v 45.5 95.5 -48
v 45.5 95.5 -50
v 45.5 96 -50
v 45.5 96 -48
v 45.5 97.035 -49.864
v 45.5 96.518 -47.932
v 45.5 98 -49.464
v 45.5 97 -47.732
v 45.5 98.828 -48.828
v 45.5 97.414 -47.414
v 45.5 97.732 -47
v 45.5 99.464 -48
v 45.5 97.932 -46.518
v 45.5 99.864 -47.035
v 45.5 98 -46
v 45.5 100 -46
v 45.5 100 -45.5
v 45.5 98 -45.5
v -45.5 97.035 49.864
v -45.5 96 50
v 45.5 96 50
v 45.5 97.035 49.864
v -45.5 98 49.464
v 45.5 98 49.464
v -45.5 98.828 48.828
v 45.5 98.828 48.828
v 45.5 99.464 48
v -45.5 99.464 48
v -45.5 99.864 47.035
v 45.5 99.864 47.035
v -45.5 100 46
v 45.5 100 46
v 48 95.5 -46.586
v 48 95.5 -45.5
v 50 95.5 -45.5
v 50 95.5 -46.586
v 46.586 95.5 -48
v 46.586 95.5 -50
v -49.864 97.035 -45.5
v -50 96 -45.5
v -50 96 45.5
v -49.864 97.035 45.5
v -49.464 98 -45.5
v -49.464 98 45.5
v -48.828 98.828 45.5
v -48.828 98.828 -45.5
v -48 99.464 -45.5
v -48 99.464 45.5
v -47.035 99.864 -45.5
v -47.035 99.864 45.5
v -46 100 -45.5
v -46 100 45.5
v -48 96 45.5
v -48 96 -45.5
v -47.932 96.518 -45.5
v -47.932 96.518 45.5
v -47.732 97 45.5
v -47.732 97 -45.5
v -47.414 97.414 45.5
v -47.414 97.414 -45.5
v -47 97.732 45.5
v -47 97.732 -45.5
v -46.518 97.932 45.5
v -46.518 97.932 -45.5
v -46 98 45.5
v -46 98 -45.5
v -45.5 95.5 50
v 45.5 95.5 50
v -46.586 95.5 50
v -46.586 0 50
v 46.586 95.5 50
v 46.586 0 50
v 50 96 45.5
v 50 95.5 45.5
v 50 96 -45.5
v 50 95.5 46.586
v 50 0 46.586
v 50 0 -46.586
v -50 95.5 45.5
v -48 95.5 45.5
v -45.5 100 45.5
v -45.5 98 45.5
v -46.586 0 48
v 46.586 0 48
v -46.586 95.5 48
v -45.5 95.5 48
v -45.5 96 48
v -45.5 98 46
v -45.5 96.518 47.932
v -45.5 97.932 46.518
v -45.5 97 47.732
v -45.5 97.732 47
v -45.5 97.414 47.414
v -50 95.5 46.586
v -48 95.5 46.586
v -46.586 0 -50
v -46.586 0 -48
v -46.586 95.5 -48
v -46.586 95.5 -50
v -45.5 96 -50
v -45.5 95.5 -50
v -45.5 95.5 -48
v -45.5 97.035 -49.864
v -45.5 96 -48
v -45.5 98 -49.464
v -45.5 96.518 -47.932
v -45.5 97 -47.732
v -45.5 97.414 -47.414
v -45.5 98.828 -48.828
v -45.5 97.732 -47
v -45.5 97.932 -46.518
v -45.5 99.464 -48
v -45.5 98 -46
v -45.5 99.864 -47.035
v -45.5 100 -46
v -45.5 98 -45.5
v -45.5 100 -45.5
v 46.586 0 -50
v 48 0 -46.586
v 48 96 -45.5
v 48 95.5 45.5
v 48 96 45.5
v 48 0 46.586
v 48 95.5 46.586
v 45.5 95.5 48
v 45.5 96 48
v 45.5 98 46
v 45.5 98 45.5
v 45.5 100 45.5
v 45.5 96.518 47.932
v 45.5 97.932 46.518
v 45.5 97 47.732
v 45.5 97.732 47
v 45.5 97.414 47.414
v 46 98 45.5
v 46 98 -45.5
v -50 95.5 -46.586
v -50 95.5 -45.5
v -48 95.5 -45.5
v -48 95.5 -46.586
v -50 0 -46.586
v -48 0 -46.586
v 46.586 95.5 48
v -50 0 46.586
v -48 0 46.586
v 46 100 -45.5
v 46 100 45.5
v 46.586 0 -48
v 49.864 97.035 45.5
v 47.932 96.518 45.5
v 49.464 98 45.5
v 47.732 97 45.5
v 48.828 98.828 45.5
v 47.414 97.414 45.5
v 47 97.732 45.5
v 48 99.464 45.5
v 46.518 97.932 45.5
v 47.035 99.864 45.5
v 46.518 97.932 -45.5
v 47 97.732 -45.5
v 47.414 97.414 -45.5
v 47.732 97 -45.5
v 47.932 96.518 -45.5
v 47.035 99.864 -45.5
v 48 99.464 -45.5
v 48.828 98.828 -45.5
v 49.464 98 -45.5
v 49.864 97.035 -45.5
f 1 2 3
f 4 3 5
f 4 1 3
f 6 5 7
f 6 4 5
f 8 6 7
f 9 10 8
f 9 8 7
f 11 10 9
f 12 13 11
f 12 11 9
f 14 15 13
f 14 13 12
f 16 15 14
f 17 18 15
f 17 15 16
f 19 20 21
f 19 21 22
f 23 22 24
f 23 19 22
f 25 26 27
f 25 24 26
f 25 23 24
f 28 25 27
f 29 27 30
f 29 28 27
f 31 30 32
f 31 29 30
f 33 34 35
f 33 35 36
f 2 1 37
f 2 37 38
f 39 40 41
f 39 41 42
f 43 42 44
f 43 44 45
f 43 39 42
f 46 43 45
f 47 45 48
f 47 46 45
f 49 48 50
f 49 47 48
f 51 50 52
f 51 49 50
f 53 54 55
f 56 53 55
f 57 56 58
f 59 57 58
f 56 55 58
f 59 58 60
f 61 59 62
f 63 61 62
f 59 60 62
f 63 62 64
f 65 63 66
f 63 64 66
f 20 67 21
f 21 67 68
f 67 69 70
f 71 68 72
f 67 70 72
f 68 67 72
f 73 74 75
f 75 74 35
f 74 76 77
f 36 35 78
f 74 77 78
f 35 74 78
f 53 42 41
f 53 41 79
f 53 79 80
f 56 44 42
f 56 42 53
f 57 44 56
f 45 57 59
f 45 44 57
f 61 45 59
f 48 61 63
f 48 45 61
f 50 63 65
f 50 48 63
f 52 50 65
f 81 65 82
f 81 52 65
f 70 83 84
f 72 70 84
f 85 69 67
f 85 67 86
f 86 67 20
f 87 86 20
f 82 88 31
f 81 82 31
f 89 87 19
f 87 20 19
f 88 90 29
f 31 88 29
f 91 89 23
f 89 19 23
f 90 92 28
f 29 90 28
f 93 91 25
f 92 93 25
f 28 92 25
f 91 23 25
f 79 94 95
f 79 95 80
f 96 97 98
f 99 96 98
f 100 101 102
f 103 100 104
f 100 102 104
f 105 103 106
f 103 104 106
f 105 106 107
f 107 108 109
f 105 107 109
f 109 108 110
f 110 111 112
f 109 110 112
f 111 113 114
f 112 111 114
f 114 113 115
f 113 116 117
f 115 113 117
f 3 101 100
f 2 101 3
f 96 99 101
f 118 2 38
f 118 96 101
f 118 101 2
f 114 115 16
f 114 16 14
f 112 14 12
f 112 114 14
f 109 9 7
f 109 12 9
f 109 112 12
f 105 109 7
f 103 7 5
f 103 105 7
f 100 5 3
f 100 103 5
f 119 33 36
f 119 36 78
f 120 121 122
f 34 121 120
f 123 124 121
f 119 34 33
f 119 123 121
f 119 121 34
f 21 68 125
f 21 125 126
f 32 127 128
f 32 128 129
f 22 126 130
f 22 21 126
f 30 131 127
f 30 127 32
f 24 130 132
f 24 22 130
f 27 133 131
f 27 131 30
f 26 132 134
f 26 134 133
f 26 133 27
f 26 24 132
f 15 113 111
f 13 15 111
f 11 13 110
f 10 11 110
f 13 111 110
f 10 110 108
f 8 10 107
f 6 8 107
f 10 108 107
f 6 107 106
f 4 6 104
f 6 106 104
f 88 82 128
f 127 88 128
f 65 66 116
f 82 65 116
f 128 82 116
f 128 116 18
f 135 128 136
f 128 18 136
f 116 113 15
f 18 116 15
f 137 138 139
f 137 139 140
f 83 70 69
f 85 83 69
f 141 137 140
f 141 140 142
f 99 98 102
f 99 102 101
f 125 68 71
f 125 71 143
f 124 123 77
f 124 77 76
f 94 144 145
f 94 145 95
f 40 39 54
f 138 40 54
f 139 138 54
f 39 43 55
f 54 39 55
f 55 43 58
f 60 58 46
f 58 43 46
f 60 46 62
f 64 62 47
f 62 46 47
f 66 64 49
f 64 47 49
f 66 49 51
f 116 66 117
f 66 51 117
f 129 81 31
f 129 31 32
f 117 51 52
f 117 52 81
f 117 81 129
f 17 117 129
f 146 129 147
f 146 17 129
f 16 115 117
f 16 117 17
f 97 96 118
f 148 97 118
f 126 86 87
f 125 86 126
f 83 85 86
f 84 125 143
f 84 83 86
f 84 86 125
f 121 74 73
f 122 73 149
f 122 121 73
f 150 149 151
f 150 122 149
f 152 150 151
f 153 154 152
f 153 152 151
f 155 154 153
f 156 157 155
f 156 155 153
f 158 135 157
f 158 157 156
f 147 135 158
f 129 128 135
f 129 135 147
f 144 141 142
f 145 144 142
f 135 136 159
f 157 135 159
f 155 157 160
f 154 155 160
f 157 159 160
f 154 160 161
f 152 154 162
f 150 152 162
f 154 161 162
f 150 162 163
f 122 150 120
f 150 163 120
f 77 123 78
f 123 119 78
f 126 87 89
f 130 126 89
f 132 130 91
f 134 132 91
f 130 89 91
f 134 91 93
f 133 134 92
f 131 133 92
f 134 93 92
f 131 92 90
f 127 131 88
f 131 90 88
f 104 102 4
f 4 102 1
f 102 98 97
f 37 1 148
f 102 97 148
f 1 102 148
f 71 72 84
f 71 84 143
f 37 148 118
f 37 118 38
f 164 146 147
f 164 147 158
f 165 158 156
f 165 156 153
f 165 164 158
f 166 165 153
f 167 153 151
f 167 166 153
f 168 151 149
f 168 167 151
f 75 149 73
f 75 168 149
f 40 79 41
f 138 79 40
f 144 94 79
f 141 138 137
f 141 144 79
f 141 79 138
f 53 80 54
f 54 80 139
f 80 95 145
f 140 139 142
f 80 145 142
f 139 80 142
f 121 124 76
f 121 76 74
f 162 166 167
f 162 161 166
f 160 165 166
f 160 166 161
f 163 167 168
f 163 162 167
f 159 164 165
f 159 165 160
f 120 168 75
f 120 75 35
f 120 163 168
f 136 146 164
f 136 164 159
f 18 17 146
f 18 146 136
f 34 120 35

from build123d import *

# Parameters (mm, degrees)
SKETCH_1_W            = 100
SKETCH_1_H            = 100
EXTRUDE_1_DEPTH       = 100
SHELL_1_T             = -2
SHEET_START           = -51
SHEET_METAL_1_DEPTH   = 4.414213562
SHEET_START_2         = 46.585786438
SHEET_METAL_1_2_DEPTH = 4.414213562
SHEET_START_3         = -46.585786438
SHEET_METAL_1_3_DEPTH = 93.171572876
SHEET_METAL_1_4_DEPTH = 1.085786438
SHEET_START_4         = 45.5
SHEET_METAL_1_5_DEPTH = 1.085786438
SHEET_START_5         = -45.5
SHEET_METAL_1_6_DEPTH = 91
SHEET_METAL_1_7_DEPTH = 91
SHEET_METAL_1_8_DEPTH = 91


with BuildPart() as part:
    # Sketch 1 → 凸台-拉伸1 (new body)
    with BuildSketch(Plane(origin=(0, 0, 0), x_dir=(1, 0, 0), z_dir=(0, 1, 0))):
        Rectangle(SKETCH_1_W, SKETCH_1_H)
    extrude(amount=EXTRUDE_1_DEPTH)

    # 抽壳1
    shell_1_openings = [part.faces().sort_by_distance(p)[0] for p in [
        (0, 0, 0),
    ]]
    offset(amount=SHELL_1_T, openings=shell_1_openings, kind=Kind.INTERSECTION)

    # Sheet Metal 1: read off the stored shape, not the designer's step
    # Sheet Metal 1 outline → Sheet Metal 1 (cut)
    with BuildSketch(Plane.YZ.offset(SHEET_START)):
        Polygon((0, 50), (0, 46.585786438), (95.5, 46.585786438), (95.5, 45.5), (100, 45.5), (100, 50), align=None)
        Polygon((0, -46.585786438), (0, -50), (100, -50), (100, -45.5), (95.5, -45.5), (95.5, -46.585786438), align=None)
    extrude(amount=SHEET_METAL_1_DEPTH, mode=Mode.SUBTRACT)

    # Sheet Metal 1 2 outline → Sheet Metal 1 2 (cut)
    with BuildSketch(Plane.YZ.offset(SHEET_START_2)):
        Polygon((0, 50), (0, 46.585786438), (95.5, 46.585786438), (95.5, 45.5), (100, 45.5), (100, 50), align=None)
        Polygon((0, -46.585786438), (0, -50), (100, -50), (100, -45.5), (95.5, -45.5), (95.5, -46.585786438), align=None)
    extrude(amount=SHEET_METAL_1_2_DEPTH, mode=Mode.SUBTRACT)

    # Sheet Metal 1 3 outline → Sheet Metal 1 3 (cut)
    with BuildSketch(Plane.YZ.offset(SHEET_START_3)):
        with BuildLine():
            ThreePointArc((96, 50), (98.828427125, 48.828427125), (100, 46))
            Line((100, 46), (100, 50))
            Line((100, 50), (96, 50))
        make_face()
        with BuildLine():
            Line((100, -50), (100, -46))
            ThreePointArc((100, -46), (98.828427125, -48.828427125), (96, -50))
            Line((96, -50), (100, -50))
        make_face()
    extrude(amount=SHEET_METAL_1_3_DEPTH, mode=Mode.SUBTRACT)

    # Sheet Metal 1 4 outline → Sheet Metal 1 4 (cut)
    with BuildSketch(Plane.YZ.offset(SHEET_START_3)):
        with BuildLine():
            Line((98, 48), (98, 45.5))
            Line((98, 45.5), (100, 45.5))
            Line((100, 45.5), (100, 46))
            ThreePointArc((100, 46), (98.828427125, 48.828427125), (96, 50))
            Line((96, 50), (95.5, 50))
            Line((95.5, 50), (95.5, 48))
            Line((95.5, 48), (98, 48))
        make_face()
        with BuildLine():
            Line((100, -45.5), (98, -45.5))
            Line((98, -45.5), (98, -48))
            Line((98, -48), (95.5, -48))
            Line((95.5, -48), (95.5, -50))
            Line((95.5, -50), (96, -50))
            ThreePointArc((96, -50), (98.828427125, -48.828427125), (100, -46))
            Line((100, -46), (100, -45.5))
        make_face()
    extrude(amount=SHEET_METAL_1_4_DEPTH, mode=Mode.SUBTRACT)

    # Sheet Metal 1 5 outline → Sheet Metal 1 5 (cut)
    with BuildSketch(Plane.YZ.offset(SHEET_START_4)):
        with BuildLine():
            Line((98, 48), (98, 45.5))
            Line((98, 45.5), (100, 45.5))
            Line((100, 45.5), (100, 46))
            ThreePointArc((100, 46), (98.828427125, 48.828427125), (96, 50))
            Line((96, 50), (95.5, 50))
            Line((95.5, 50), (95.5, 48))
            Line((95.5, 48), (98, 48))
        make_face()
        with BuildLine():
            Line((100, -45.5), (98, -45.5))
            Line((98, -45.5), (98, -48))
            Line((98, -48), (95.5, -48))
            Line((95.5, -48), (95.5, -50))
            Line((95.5, -50), (96, -50))
            ThreePointArc((96, -50), (98.828427125, -48.828427125), (100, -46))
            Line((100, -46), (100, -45.5))
        make_face()
    extrude(amount=SHEET_METAL_1_5_DEPTH, mode=Mode.SUBTRACT)

    # Sheet Metal 1 6 outline → Sheet Metal 1 6 (add)
    with BuildSketch(Plane.YZ.offset(SHEET_START_5)):
        with BuildLine():
            ThreePointArc((96, 48), (97.414213562, 47.414213562), (98, 46))
            Line((98, 46), (98, 48))
            Line((98, 48), (96, 48))
        make_face()
        with BuildLine():
            Line((98, -48), (98, -46))
            ThreePointArc((98, -46), (97.414213562, -47.414213562), (96, -48))
            Line((96, -48), (98, -48))
        make_face()
    extrude(amount=SHEET_METAL_1_6_DEPTH)

    # Sheet Metal 1 7 outline → Sheet Metal 1 7 (cut)
    with BuildSketch(Plane.XY.offset(SHEET_START_5)):
        with BuildLine():
            Line((-50, 100), (-50, 96))
            ThreePointArc((-50, 96), (-48.828427125, 98.828427125), (-46, 100))
            Line((-46, 100), (-50, 100))
        make_face()
        with BuildLine():
            Line((50, 100), (46, 100))
            ThreePointArc((46, 100), (48.828427125, 98.828427125), (50, 96))
            Line((50, 96), (50, 100))
        make_face()
    extrude(amount=SHEET_METAL_1_7_DEPTH, mode=Mode.SUBTRACT)

    # Sheet Metal 1 8 outline → Sheet Metal 1 8 (add)
    with BuildSketch(Plane.XY.offset(SHEET_START_5)):
        with BuildLine():
            Line((-48, 98), (-48, 96))
            ThreePointArc((-48, 96), (-47.414213562, 97.414213562), (-46, 98))
            Line((-46, 98), (-48, 98))
        make_face()
        with BuildLine():
            Line((48, 98), (46, 98))
            ThreePointArc((46, 98), (47.414213562, 97.414213562), (48, 96))
            Line((48, 96), (48, 98))
        make_face()
    extrude(amount=SHEET_METAL_1_8_DEPTH)


solid = part.part
